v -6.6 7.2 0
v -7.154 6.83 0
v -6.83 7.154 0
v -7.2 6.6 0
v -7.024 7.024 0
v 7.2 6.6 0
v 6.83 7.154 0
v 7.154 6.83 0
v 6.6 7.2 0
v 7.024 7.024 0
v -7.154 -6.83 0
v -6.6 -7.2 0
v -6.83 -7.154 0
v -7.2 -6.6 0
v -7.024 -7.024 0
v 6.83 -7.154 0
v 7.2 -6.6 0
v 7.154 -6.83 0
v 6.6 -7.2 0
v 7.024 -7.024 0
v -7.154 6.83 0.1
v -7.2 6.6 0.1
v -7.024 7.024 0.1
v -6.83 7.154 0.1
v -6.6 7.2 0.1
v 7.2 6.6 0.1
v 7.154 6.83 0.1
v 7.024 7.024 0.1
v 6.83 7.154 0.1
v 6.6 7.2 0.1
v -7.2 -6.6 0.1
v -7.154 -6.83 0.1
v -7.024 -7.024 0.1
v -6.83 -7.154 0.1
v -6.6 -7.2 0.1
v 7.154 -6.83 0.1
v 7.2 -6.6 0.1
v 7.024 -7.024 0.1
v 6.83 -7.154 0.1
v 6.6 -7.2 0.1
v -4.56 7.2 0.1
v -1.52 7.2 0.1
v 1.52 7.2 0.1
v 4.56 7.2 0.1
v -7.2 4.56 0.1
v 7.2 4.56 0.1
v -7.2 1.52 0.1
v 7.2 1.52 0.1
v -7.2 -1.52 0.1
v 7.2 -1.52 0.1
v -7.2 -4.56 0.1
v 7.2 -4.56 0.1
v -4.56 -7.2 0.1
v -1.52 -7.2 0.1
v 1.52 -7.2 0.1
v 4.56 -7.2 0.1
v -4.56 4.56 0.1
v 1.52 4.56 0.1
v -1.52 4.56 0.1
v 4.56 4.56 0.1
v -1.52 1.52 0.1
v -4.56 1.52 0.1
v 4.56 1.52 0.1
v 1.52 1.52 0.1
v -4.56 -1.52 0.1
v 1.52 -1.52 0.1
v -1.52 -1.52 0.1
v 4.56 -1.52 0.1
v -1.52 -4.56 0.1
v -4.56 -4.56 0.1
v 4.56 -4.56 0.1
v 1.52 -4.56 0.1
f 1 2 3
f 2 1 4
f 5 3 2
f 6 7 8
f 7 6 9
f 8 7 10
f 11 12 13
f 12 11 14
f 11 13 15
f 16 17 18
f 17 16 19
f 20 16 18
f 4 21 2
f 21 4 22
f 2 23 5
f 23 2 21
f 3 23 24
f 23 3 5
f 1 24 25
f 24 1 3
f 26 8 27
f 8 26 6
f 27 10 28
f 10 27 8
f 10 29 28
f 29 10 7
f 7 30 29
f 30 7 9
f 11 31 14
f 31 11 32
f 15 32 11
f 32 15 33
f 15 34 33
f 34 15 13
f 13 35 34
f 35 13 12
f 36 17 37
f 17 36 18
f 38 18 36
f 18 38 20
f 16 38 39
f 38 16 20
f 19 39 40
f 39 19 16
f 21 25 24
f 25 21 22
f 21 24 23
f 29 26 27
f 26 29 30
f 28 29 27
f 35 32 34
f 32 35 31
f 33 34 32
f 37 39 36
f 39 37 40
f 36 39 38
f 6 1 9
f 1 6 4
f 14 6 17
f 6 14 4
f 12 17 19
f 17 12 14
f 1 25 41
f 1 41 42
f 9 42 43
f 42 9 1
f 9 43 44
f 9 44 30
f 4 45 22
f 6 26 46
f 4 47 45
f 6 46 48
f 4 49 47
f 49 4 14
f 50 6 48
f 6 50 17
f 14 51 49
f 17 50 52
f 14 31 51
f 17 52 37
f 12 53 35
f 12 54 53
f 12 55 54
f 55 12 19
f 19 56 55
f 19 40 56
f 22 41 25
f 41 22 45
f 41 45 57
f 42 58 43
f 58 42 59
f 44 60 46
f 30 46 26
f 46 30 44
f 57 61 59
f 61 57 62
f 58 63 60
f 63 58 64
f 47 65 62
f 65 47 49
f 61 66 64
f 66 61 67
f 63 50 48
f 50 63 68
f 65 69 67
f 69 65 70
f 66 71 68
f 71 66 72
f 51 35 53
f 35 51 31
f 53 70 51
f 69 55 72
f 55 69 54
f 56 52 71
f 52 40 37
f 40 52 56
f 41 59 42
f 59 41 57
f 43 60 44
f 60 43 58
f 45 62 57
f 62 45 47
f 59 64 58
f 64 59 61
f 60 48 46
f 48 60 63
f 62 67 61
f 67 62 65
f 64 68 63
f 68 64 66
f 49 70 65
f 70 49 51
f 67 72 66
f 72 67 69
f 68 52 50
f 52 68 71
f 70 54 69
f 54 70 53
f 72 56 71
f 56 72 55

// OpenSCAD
// file: ../p/1-4cyli.scad
use <../lib.scad>
function ldraw_lib__1_4cyli() = [
// 0 Cylinder 0.25
// 0 Name: 1-4cyli.dat
// 0 Author: James Jessiman
// 0 !LDRAW_ORG Primitive UPDATE 2012-01
// 0 !LICENSE Licensed under CC BY 4.0 : see CAreadme.txt
// 
// 0 BFC CERTIFY CCW
  [0,"BFC","CERTIFY"],
  [0,"BFC","CCW"],
// 
// 0 !HISTORY 2002-03-23 [sbliss] Added BFC statement.
// 0 !HISTORY 2002-04-25 [PTadmin] Official Update 2002-02
// 0 !HISTORY 2007-06-22 [PTadmin] Header formatted for Contributor Agreement
// 0 !HISTORY 2008-07-01 [PTadmin] Official Update 2008-01
// 0 !HISTORY 2012-02-16 [Philo] Changed to CCW
// 0 !HISTORY 2012-03-30 [PTadmin] Official Update 2012-01
// 
// 
// 4 16 1 1 0 0.9239 1 0.3827 0.9239 0 0.3827 1 0 0
  [4,16,1,1,0,0.9239,1,0.3827,0.9239,0,0.3827,1,0,0],
// 5 24 1 0 0 1 1 0 0.9239 0 0.3827 1 0 -1
  [5,24,1,0,0,1,1,0,0.9239,0,0.3827,1,0,-1],
// 4 16 0.9239 1 0.3827 0.7071 1 0.7071 0.7071 0 0.7071 0.9239 0 0.3827
  [4,16,0.9239,1,0.3827,0.7071,1,0.7071,0.7071,0,0.7071,0.9239,0,0.3827],
// 5 24 0.9239 0 0.3827 0.9239 1 0.3827 0.7071 0 0.7071 1 0 0
  [5,24,0.9239,0,0.3827,0.9239,1,0.3827,0.7071,0,0.7071,1,0,0],
// 4 16 0.7071 1 0.7071 0.3827 1 0.9239 0.3827 0 0.9239 0.7071 0 0.7071
  [4,16,0.7071,1,0.7071,0.3827,1,0.9239,0.3827,0,0.9239,0.7071,0,0.7071],
// 5 24 0.7071 0 0.7071 0.7071 1 0.7071 0.3827 0 0.9239 0.9239 0 0.3827
  [5,24,0.7071,0,0.7071,0.7071,1,0.7071,0.3827,0,0.9239,0.9239,0,0.3827],
// 4 16 0.3827 1 0.9239 0 1 1 0 0 1 0.3827 0 0.9239
  [4,16,0.3827,1,0.9239,0,1,1,0,0,1,0.3827,0,0.9239],
// 5 24 0.3827 0 0.9239 0.3827 1 0.9239 0 0 1 0.7071 0 0.7071
  [5,24,0.3827,0,0.9239,0.3827,1,0.9239,0,0,1,0.7071,0,0.7071],
// 5 24 0 0 1 0 1 1 0.3827 0 0.9239 -1 0 1
  [5,24,0,0,1,0,1,1,0.3827,0,0.9239,-1,0,1],
];
module ldraw_lib__1_4cyli(step=0, col=false, unit=2/5, alt=false, line=0.2, solid=!$preview)
    makepoly(ldraw_lib__1_4cyli(), step=step, col=col, unit=unit, alt=alt, line=line, solid=solid);
ldraw_lib__1_4cyli(line=0.2);
// file: ../p/1-4chrd.scad
use <../lib.scad>
function ldraw_lib__1_4chrd() = [
// 0 Chord 0.25
// 0 Name: 1-4chrd.dat
// 0 Author: Max Martin Richter [MMR1988]
// 0 !LDRAW_ORG Primitive UPDATE 2023-05
// 0 !LICENSE Licensed under CC BY 4.0 : see CAreadme.txt
// 
// 0 BFC CERTIFY CCW
  [0,"BFC","CERTIFY"],
  [0,"BFC","CCW"],
// 
// 0 !HISTORY 2004-04-22 [PTadmin] Official Update 2004-02
// 0 !HISTORY 2007-10-09 [PTadmin] Header formatted for Contributor Agreement
// 0 !HISTORY 2008-07-01 [PTadmin] Official Update 2008-01
// 0 !HISTORY 2012-08-02 [MMR1988] Re-creation with PrimGen2 and Rectifier
// 0 !HISTORY 2012-08-09 [PTadmin] Official Update 2012-02
// 0 !HISTORY 2023-10-27 [OrionP] Change author to MMR1988 from hafhead
// 0 !HISTORY 2023-10-31 [OrionP] Official Update 2023-05
// 
// 4 16 0.9239 0 0.3827 0.3827 0 0.9239 0 0 1 1 0 0
  [4,16,0.9239,0,0.3827,0.3827,0,0.9239,0,0,1,1,0,0],
// 3 16 0.7071 0 0.7071 0.3827 0 0.9239 0.9239 0 0.3827
  [3,16,0.7071,0,0.7071,0.3827,0,0.9239,0.9239,0,0.3827],
];
module ldraw_lib__1_4chrd(step=0, col=false, unit=2/5, alt=false, line=0.2, solid=!$preview)
    makepoly(ldraw_lib__1_4chrd(), step=step, col=col, unit=unit, alt=alt, line=line, solid=solid);
ldraw_lib__1_4chrd(line=0.2);
// main file
use <../lib.scad>
use <6142617z.scad>
function ldraw_lib__6142271p() = [
// 0 =Sticker  1.8 x  1.8 Chequered
// 0 Name: 6142271p.dat
// 0 Author: Massimo Maso [Sirio]
// 0 !LDRAW_ORG Part Alias UPDATE 2025-02
// 0 !LICENSE Licensed under CC BY 4.0 : see CAreadme.txt
// 
// 0 BFC CERTIFY CCW
  [0,"BFC","CERTIFY"],
  [0,"BFC","CCW"],
// 
// 0 !KEYWORDS Audi, Bricklink 75873stk01a, Brickowl 427960, LMS, R8
// 0 !KEYWORDS Rebrickable 24755, Set 75873, Speed Champions, Ultra
// 
// 0 !HISTORY 2025-02-27 [OrionP] Official Update 2025-02
// 
// 1 16 0 0 0 1 0 0 0 1 0 0 0 1 6142617z.dat
  [1,16,0,0,0,1,0,0,0,1,0,0,0,1, ldraw_lib__6142617z()],
];
module ldraw_lib__6142271p(step=0, col=false, unit=2/5, alt=false, line=0.2, solid=!$preview)
    makepoly(ldraw_lib__6142271p(), step=step, col=col, unit=unit, alt=alt, line=line, solid=solid);
ldraw_lib__6142271p(line=0.2);
